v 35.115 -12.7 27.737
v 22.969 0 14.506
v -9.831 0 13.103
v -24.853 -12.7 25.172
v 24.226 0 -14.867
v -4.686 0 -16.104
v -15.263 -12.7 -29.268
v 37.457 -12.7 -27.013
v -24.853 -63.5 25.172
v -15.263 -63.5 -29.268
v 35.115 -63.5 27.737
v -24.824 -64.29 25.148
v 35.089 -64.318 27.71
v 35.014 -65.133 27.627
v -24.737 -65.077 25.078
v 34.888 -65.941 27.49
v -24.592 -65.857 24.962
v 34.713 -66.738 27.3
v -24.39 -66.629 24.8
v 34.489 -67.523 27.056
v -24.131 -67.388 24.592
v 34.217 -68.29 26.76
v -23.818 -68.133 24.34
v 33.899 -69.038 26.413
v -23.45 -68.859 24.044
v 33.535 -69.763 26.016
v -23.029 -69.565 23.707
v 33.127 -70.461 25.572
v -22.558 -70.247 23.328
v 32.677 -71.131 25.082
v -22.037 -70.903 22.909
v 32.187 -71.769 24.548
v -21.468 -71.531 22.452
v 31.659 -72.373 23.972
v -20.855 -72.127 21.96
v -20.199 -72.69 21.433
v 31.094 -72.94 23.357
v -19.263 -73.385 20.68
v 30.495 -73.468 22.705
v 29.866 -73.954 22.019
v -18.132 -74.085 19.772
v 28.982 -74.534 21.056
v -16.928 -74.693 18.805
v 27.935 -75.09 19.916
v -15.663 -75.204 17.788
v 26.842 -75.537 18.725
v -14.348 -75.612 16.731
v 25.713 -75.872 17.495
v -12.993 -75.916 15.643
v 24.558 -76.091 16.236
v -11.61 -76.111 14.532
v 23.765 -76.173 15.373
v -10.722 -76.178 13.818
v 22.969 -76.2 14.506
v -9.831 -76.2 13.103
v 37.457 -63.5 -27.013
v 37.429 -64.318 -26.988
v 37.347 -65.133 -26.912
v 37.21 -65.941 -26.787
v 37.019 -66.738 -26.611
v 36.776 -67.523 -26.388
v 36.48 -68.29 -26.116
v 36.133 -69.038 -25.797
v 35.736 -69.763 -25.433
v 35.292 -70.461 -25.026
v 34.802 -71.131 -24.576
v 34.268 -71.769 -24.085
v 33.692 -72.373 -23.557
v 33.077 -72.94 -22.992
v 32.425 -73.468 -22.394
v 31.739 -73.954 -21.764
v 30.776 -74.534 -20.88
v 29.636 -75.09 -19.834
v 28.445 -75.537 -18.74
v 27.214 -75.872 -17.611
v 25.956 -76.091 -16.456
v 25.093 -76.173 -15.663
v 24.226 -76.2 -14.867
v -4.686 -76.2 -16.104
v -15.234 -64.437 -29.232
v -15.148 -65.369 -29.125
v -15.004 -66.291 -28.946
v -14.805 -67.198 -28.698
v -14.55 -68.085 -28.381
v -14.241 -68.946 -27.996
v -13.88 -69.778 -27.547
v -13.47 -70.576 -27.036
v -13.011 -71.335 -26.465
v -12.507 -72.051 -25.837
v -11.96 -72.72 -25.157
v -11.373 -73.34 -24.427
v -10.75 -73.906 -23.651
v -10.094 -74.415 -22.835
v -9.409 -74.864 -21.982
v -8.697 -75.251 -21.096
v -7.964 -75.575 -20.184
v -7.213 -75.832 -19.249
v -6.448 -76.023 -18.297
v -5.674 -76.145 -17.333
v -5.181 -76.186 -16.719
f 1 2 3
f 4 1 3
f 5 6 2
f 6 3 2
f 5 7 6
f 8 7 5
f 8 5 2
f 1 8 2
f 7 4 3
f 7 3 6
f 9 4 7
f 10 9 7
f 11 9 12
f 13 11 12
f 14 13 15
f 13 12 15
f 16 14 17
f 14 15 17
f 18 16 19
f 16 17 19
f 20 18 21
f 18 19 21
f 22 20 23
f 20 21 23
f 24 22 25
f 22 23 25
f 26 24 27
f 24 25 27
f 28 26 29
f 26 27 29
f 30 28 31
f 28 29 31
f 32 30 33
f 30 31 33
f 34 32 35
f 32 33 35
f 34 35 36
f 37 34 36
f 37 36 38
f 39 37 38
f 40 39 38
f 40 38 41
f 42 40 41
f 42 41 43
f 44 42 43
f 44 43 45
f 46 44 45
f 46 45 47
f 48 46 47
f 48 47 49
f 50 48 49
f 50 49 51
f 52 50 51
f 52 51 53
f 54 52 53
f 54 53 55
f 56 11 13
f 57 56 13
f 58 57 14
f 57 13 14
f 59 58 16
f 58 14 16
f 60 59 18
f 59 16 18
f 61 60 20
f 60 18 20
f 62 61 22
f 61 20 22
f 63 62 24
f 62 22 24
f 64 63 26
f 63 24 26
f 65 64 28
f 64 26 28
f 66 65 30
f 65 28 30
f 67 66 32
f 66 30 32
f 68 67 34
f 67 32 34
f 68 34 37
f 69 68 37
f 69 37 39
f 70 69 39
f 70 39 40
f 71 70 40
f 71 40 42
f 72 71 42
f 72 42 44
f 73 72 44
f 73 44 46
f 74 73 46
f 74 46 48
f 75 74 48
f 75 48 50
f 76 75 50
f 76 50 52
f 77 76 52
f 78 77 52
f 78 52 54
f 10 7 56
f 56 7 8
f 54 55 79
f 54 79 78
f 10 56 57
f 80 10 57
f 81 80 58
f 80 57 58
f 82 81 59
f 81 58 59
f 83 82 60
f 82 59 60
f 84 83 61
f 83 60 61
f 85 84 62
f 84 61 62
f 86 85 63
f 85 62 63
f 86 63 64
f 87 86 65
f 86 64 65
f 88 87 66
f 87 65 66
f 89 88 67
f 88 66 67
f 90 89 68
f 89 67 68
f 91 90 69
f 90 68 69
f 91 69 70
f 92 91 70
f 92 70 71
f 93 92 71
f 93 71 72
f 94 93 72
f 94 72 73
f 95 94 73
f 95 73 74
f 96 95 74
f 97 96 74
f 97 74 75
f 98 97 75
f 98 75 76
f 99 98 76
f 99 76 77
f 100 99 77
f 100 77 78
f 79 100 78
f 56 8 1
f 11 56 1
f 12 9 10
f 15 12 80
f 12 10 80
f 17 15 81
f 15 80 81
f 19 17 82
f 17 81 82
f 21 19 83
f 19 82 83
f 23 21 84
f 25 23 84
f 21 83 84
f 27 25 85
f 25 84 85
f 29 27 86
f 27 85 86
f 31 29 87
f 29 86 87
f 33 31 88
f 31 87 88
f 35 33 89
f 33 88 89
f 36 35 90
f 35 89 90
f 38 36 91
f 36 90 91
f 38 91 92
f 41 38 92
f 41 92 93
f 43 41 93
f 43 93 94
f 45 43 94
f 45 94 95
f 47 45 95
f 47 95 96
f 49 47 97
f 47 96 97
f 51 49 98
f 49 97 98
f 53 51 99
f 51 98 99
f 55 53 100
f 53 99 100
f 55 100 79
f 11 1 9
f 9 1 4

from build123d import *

# Parameters (mm, degrees)
F1_DEPTH = 76.2
F2_R     = 12.7
F3_SIZE  = 12.7


with BuildPart() as f1:
    # F0 (on Front) → F1 (new body)
    with BuildSketch(Plane.XZ):
        Polygon((35.114609, 27.737115), (-24.852807, 25.171665), (-15.263049, -29.26831), (37.456854, -27.012915), align=None)
    extrude(amount=F1_DEPTH)

    # F2
    f2_edges = [f1.edges().sort_by_distance(p)[0] for p in [
        (5.130901, -76.2, 26.45439),
        (36.285732, -76.2, 0.3621),
        (11.096903, -76.2, -28.140613),
        (-20.057928, -76.2, -2.048322),
    ]]
    fillet(f2_edges, radius=F2_R)

    # F3
    f3_edges = [f1.edges().sort_by_distance(p)[0] for p in [
        (11.096903, 0, -28.140613),
        (5.130901, 0, 26.45439),
        (36.285732, 0, 0.3621),
        (-20.057928, 0, -2.048322),
    ]]
    chamfer(f3_edges, length=F3_SIZE)


solid = f1.part
